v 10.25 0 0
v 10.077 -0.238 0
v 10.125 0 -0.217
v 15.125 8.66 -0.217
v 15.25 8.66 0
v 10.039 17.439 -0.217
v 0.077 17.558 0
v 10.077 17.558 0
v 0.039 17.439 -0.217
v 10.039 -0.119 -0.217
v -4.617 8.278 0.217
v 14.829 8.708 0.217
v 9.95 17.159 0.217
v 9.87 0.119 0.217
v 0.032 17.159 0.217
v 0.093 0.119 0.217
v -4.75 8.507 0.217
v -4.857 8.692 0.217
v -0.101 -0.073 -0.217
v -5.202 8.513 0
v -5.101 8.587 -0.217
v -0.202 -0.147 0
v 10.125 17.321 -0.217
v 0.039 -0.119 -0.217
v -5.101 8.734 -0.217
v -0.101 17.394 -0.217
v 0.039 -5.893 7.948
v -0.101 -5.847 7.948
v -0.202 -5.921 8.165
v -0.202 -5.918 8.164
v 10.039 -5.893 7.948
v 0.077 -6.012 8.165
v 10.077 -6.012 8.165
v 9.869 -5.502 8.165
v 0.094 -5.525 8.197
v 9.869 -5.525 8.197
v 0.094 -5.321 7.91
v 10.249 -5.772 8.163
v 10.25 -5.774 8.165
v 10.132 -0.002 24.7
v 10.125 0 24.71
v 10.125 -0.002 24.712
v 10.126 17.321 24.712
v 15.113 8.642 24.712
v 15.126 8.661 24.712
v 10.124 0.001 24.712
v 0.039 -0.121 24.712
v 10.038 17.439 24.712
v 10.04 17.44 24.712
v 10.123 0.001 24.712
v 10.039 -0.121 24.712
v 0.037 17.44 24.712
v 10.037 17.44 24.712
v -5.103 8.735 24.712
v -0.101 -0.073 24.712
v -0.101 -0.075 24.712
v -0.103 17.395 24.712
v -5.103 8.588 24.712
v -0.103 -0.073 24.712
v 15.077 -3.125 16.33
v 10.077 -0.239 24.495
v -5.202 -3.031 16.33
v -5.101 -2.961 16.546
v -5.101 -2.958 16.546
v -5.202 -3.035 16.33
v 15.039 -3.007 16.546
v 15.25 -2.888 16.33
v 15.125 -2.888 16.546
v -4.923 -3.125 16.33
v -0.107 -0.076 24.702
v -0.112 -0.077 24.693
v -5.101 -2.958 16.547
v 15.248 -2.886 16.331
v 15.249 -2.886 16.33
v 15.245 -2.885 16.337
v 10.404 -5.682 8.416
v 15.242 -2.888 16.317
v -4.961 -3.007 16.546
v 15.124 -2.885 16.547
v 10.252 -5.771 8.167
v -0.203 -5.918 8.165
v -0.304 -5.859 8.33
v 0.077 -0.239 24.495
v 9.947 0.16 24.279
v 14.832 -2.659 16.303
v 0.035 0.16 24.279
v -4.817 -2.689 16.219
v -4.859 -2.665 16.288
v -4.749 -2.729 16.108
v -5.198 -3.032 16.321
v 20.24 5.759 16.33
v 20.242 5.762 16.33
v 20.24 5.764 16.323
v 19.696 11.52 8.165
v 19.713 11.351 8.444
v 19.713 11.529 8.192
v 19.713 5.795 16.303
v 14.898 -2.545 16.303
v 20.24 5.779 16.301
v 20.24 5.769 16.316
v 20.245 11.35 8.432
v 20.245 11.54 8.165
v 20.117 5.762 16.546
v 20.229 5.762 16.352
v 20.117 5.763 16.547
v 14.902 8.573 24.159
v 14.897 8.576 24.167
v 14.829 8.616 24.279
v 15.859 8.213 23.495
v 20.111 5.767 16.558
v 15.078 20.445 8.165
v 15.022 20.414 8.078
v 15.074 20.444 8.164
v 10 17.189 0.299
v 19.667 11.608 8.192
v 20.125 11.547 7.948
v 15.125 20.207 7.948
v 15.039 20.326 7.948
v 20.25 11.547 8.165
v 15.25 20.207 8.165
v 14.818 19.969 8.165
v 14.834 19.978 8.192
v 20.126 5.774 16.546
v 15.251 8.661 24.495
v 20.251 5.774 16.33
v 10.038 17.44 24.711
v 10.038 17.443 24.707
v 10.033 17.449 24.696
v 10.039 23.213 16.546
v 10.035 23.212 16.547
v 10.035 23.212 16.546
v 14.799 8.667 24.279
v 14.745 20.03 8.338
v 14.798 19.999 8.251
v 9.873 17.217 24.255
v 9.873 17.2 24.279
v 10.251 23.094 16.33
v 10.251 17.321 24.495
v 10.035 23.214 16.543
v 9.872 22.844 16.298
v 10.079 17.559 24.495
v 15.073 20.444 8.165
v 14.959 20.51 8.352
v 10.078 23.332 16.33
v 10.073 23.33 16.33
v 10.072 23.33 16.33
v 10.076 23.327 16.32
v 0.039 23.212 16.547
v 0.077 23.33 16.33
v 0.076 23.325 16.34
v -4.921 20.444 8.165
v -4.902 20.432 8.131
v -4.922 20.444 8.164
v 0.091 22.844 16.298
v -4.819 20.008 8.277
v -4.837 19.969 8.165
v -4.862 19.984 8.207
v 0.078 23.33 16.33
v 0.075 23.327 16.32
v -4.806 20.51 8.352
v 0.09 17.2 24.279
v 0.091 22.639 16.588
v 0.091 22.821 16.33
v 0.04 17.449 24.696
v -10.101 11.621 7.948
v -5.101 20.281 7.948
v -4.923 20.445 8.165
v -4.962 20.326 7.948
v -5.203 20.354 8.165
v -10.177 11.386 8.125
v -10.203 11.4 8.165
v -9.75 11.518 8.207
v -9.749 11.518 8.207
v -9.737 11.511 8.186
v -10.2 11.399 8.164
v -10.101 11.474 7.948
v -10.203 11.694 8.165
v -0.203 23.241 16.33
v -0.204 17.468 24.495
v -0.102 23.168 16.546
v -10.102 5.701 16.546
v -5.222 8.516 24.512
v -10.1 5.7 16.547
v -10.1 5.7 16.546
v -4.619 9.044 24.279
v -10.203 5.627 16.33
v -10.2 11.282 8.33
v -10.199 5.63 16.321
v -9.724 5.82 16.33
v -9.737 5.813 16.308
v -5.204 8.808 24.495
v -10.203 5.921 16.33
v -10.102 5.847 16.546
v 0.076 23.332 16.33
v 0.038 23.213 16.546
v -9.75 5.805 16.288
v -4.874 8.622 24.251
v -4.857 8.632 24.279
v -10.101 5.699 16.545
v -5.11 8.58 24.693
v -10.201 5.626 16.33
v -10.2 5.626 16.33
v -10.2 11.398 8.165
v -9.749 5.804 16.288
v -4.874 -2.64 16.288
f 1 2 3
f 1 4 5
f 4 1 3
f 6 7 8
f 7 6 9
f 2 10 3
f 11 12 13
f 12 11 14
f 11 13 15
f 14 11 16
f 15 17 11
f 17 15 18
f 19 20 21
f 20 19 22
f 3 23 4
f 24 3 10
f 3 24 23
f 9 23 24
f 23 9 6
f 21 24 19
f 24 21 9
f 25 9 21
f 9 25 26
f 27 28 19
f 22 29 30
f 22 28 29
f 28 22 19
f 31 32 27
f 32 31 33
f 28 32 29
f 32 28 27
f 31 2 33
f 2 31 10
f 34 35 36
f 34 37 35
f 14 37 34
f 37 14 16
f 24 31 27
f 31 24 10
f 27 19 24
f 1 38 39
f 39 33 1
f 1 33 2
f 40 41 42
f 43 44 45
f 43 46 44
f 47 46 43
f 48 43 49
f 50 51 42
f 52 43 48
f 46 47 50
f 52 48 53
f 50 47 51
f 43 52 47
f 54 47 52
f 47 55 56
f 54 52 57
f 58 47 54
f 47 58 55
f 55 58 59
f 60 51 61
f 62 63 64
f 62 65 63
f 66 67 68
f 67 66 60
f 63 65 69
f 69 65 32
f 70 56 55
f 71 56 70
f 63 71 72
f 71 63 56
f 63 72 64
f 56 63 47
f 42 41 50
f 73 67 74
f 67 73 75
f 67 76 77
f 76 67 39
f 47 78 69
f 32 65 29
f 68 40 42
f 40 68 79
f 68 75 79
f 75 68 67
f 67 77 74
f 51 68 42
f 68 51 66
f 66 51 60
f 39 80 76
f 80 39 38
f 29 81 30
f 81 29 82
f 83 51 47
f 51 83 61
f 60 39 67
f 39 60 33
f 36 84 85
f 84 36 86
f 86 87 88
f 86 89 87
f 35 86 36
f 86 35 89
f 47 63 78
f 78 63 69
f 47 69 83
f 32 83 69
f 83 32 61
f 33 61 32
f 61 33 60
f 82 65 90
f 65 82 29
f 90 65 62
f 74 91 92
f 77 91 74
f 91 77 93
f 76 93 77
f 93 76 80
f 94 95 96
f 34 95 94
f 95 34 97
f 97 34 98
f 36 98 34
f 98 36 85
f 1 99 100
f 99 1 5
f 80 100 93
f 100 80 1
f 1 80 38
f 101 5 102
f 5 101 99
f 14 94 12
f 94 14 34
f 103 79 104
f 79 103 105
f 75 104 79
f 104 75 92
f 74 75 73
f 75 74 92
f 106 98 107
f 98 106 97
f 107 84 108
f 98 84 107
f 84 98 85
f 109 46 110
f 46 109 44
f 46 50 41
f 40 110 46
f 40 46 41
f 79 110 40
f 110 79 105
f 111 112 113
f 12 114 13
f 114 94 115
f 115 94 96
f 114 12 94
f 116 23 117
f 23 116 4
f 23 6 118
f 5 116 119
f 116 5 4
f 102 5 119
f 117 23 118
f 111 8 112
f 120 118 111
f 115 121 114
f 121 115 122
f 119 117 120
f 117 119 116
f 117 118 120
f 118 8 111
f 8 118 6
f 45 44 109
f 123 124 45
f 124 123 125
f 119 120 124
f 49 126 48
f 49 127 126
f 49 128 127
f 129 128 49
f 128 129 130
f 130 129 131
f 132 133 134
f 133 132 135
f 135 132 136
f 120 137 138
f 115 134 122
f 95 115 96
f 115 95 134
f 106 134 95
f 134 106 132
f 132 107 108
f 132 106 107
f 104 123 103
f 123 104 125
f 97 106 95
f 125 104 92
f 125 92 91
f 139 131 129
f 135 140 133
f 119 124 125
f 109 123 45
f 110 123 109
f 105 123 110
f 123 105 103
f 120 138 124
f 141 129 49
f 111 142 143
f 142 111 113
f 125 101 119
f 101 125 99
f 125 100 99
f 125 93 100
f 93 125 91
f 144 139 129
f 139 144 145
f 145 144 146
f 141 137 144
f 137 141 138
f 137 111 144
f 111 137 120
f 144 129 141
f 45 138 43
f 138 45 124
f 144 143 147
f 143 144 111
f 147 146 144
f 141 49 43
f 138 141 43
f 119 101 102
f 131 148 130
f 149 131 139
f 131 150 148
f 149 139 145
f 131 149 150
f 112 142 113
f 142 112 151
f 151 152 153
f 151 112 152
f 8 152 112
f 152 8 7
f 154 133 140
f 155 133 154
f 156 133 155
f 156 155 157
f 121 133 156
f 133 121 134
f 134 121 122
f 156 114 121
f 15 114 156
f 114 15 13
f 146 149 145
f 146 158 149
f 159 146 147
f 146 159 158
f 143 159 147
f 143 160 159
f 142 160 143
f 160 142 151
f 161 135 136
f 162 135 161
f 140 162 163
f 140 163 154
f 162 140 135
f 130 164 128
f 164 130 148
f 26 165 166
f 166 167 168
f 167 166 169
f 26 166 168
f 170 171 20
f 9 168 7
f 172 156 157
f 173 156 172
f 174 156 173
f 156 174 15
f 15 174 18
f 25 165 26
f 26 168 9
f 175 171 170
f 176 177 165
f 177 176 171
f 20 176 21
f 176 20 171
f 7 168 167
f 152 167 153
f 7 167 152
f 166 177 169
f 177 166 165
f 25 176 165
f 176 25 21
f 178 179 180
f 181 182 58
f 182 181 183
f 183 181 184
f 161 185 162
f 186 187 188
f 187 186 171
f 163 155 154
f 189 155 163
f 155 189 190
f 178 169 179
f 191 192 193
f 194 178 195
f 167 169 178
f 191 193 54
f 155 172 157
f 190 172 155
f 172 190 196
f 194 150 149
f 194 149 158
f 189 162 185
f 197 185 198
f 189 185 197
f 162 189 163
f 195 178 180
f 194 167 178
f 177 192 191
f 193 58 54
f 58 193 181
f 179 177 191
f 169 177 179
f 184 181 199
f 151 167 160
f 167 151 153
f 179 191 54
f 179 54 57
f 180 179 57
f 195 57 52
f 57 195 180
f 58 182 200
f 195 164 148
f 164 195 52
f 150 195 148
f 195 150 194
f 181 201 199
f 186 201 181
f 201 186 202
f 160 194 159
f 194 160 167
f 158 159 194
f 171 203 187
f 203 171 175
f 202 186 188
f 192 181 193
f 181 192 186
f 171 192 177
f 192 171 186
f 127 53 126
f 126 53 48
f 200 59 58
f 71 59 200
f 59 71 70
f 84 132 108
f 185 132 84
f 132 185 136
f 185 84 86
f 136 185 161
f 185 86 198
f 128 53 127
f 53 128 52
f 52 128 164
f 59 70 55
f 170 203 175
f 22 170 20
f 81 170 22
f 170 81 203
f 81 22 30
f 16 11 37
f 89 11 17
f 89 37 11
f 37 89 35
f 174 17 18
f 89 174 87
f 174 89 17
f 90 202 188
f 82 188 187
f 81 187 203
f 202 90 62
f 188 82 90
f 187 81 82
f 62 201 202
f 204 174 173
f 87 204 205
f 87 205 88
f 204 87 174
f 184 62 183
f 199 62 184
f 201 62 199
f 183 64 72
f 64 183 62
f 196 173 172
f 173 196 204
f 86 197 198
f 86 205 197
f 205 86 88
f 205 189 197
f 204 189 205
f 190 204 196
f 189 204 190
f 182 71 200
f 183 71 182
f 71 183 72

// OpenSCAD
/*
   folding nets of solids
   kit wallace
   

*/
//thickness of 'paper'
thickness=0.5;
// length of side
length=10;

//quality of curves
steps=20;
scale=1;


// for flattening list and lists of lists

function depth(a) =
   len(a)== undef 
       ? 0
       : 1+depth(a[0]);

function flatten(l) = [ for (a = l) for (b = a) b ] ;

function dflatten(l,d=2) =
// hack to flattened mixed list and list of lists
   flatten([for (a = l) depth(a) > d ? dflatten(a, d) : [a]]);

// dictionary shorthand assuming present
function find(key,array) =  array[search([key],array)[0]];
   
//  functions for creating the matrices for transforming a single point

function m_translate(v) = [ [1, 0, 0, 0],
                            [0, 1, 0, 0],
                            [0, 0, 1, 0],
                            [v.x, v.y, v.z, 1  ] ];

function m_scale(v) =    [ [v.x, 0, 0, 0],
                            [0, v.y, 0, 0],
                            [0, 0, v.z, 0],
                            [0, 0, 0, 1  ] ];
                                                      
function m_rotate(v) =  [ [1,  0,         0,        0],
                          [0,  cos(v.x),  sin(v.x), 0],
                          [0, -sin(v.x),  cos(v.x), 0],
                          [0,  0,         0,        1] ]
                      * [ [ cos(v.y), 0,  -sin(v.y), 0],
                          [0,         1,  0,        0],
                          [ sin(v.y), 0,  cos(v.y), 0],
                          [0,         0,  0,        1] ]
                      * [ [ cos(v.z),  sin(v.z), 0, 0],
                          [-sin(v.z),  cos(v.z), 0, 0],
                          [ 0,         0,        1, 0],
                          [ 0,         0,        0, 1] ];
                            
function m_to(centre,normal) = 
      m_rotate([0, atan2(sqrt(pow(normal.x, 2) + pow(normal.y, 2)), normal.z), 0]) 
    * m_rotate([0, 0, atan2(normal.y, normal.x)]) 
    * m_translate(centre);   

function m_rotate_to(normal) = 
      m_rotate([0, atan2(sqrt(pow(normal.x, 2) + pow(normal.y, 2)), normal.z), 0]) 
    * m_rotate([0, 0, atan2(normal.y, normal.x)]);  
  
function m_from(centre,normal) = 
      m_translate(-centre)
    * m_rotate([0, 0, -atan2(normal.y, normal.x)]) 
    * m_rotate([0, -atan2(sqrt(pow(normal.x, 2) + pow(normal.y, 2)), normal.z), 0]); 

function m_rotate_about_line(a,v1,v2) =
      m_from(v1,v2-v1)*m_rotate([0,0,a])*m_to(v1,v2-v1);

function vec3(v) = [v.x, v.y, v.z];
function m_transform(v, m)  = vec3([v.x, v.y, v.z, 1] * m);
 
function face_transform(face,m) =
     [ for (v = face) m_transform(v,m) ];

function rotate_about_edge(a,face,edge) =
     let (v1 = face[edge], v2= face[(edge+1) %len(face)])
     let (m = m_rotate_about_line(a,v1,v2))
     face_transform(face,m);

// face operations
     
function vsum(points,i=0) =  
      i < len(points)
        ?  (points[i] + vsum(points,i+1))
        :  [0,0,0];
function centre(points) = 
      vsum(points) / len(points);
     
function unitv(v)=  v/ norm(v);

function normal(face) =
     let (n=orthogonal(face[0],face[1],face[2]))
     - n / norm(n);

function signx (x) =
     x==0 ? 1 : sign(x);
     
function angle_between(u, v, n) = 
// protection against inaccurate computation
     let (x= unitv(u) * unitv(v))
     let (y = x <= -1 ? -1 :x >= 1 ? 1 : x)
     let (a = acos(y))
     let (sign = signx(n* cross(u,v)))
     
     sign*a;

function orthogonal(v0,v1,v2) =  cross(v1-v0,v2-v1);
   
function reverse(l,shift=0) = 
     [for (i=[0:len(l)-1]) l[(len(l)-1-i + shift)%len(l)]];   
                        
function r(a,face,edge=0) = 
// replicate the face rotated about edge so the two faces have an internal angle of a
// vertices are reordered so that the edge of rotation is edge 0 in the rotated face 
// and vertices are ordered anticlockwise   
     reverse(rotate_about_edge(a,face,edge),shift=edge+2);

function face_edge(face,edge) =
    [face[edge], face[(edge+1) %len(face)]];

function line(edge) = edge[1]-edge[0];
   
function rp(a,sq,sq_edge,tri,tri_edge=0) =
//  tri is the face to be placed on the sq_edge of sq at angle a
     let (sq_normal= normal(sq),
          sq_edgev=face_edge(sq,sq_edge),
          sq_corner=sq_edgev[0],
          tri_edgev=face_edge(tri,tri_edge), 
          tri_corner=tri_edgev[0],
          ma= m_translate(-tri_corner),  // make edge[0] the origin
          a_tri = face_transform(tri,ma),
          mb = m_rotate_to(-sq_normal),
          b_tri= face_transform(a_tri,mb),  // rotate tri so plane is paralledl to sq
          b_tri_corner = face_edge(b_tri,tri_edge)[0],
          offset = sq_corner - b_tri_corner,
          mc = m_translate(offset),      
          c_tri= face_transform(b_tri,mc), // translate so tri-edge[0] coincides with sq_edge[0]
          c_tri_edgev= face_edge(c_tri,tri_edge),      
          line_tri=line(c_tri_edgev),
          line_sq=line(sq_edgev),
          angle = angle_between(line_tri,line_sq,sq_normal),  // compute angle between edges
          md =  m_rotate_about_line(angle, sq_corner, sq_corner +sq_normal), 
          d_tri= face_transform(c_tri,md) //rotate about edge[0] normal to the plane of sq
          )
    r(a,d_tri,tri_edge);   // finally rotate tri about the common edge
 //   [a_tri,b_tri,c_tri,d_tri, r(a,d_tri,tri_edge),angle]
 
     ;

function place(faces,face_i) =
// place the net so that face_i is on the xy plane
   let (pface=faces[face_i])
   let (n = normal(pface), c=centre(pface))
   let (m=m_from(c,-n))
   [for(face=faces) face_transform(face,m)]
;
   
// use turtle geometry to create shapes defined by length of side and turning angle
function turtle_path(steps,pos=[0,0,0],dir=0,i=0,closed=false) =
   i <len(steps)
      ? let(step = steps[i],
          command = step[0] != undef ? step[0] : "F",
          p = step[0] == undef ? step : step[1])
          command=="L" 
            ? turtle_path(steps,pos,dir+p,i+1)
            : command=="R"
               ? turtle_path(steps,pos,dir-p,i+1)
               : command=="F" 
                 ? let (newpos = pos + p * [cos(dir), sin(dir),0])
                   concat([pos],turtle_path(steps,newpos,dir,i+1)) 
                 : turtle_path(steps,newpos,dir,i+1) // ignore
      : closed ? [pos] : [] ;   

function regular_face(length,sides) =
     turtle_path(flatten([for(i=[1:sides]) [length,["L",360/sides]]]));

function rhomboid_face(length,angle) =
     turtle_path(flatten([for(i=[1:2]) [length,["L",angle],length,["L",180-angle]]]));


// rendering  

colors=["green","blue","red","fuchsia",
        "Hotpink","aqua","teal","purple",
        "black","tan","gold","orange",
        "paleGreen","slateblue","greenyellow",
     
];

module show_edge(e,r=2) {
     translate(e[0]) sphere(r*1.5);
     translate(e[1])  sphere(r);
}

module show_face(s,t=thickness,edge=false) {
// render (convex) face by hulling spheres placed at the vertices
    hull()
    for (i=[0:len(s) -1])
       translate(s[i]) sphere(t/2);     
    if(edge) show_edge([s[0],s[1]]);
} 

module show_faces(faces,t=thickness) {
   for (i=[0:len(faces)-1]) {
      face=faces[i];
      color(colors[i])
       show_face(face,t=thickness);
   }
  
}
       
function ramp(t,dwell) =
// to shape the animation to give a dwell at begining and end
   t < dwell 
       ? 0
       : t > 1 - dwell 
         ? 1
         :  ( t-dwell) /(1 - 2 * dwell);
   
function tface(faces,hinges,current,step) =
     let(side = step[0],   // step
        face_spec = step[1],
        face = face_spec[0] == undef ? face_spec : face_spec[0],
        face_side = face_spec[0] == undef ? 0 : face_spec[1],
        a = step[2] == undef ? hinges[0] : hinges[step[2]])
     rp(a,current,side,faces[face],face_side); 
                    
function rrp(faces,hinges,tree,current) =
    let(root= tree[0])
    let (troot = current == undef ? faces[root] : tface(faces,hinges,current,root))
    concat ( [troot],
             len(tree) > 1
             ?[for (i=[1:len(tree) -1])
              let(step = tree[i])
              depth(step) == 1   //  transformation
                  ? [tface(faces,hinges,troot,step)]
                  : rrp(faces,hinges,step,troot)  // subtree
              ]
             :[]
            );           
            
function fold(name,faces,dihedral_angles,net) =
     [name,faces,dihedral_angles,net];
     
function fold_name(f) = f[0];
function fold_faces(f) = f[1];
function fold_dihedral_angles(f) = f[2];
function fold_net(f) = f[3];

module fold_render(fold, complete) {
   hinges = [for (angle = fold_dihedral_angles(fold) ) 180 -(180 - angle)*complete];
   faces = dflatten(rrp(fold_faces(fold),hinges,fold_net(fold)));
   echo(len(faces),faces);
   show_faces(faces);   
}

function D_net(length) =
   let (p=0)
   fold (
        name = "Dodecahedron",
        faces= [regular_face(length,5)],
        dihedral_angles=[125.264],
        net =  [p,[0,p],[1,p],[2,p],[3,p],
                  [[4,p], [[2,p], [[3,p],[1,p],[2,p],[3,p],[4,p]]]]]
        );
 
function I_net(length) =
   let (t=0)
   fold (
        name = "Icosahedron",
        faces= [regular_face(length,3)],
        dihedral_angles=[138 +11/60],
        net = [t,[0,t],[[1,t],[2,t],[[1,t],[1,t],[[2,t],[2,t], [[1,t],[1,t],[[2,t],[2,t]]]]]], [[2,t],[1,t],[[2,t], [2,t],[[1,t],[1,t],[[2,t],[2,t]]]]]] 
        );

function T_net(length) =
   let (tri=0)
   fold (
        name = "Tetrahedron",
        faces= [regular_face(length,3)],
        dihedral_angles=[70+32/60],
        net =  [tri,[0,tri],[1,tri],[2,tri]]
        );

function C_net(length) =
   let (sq=0)
   fold (
        name = "Cube",
        faces= [regular_face(length,4)],
        dihedral_angles=[90],
        net =  [sq, [0,sq], [1,sq] , [2,sq], [[3,sq],[2,sq] ]] 
        );

function O_net(length) =
   let (tri=0)
   fold (
        name = "Octahedron",
        faces= [regular_face(length,3)],
        dihedral_angles=[109+28/60],
        net =  [tri, [0,tri] , [[1,tri],[2,tri], [[1,tri],[2,tri]]],[[2,tri], [2,tri]]] 

        );
function tC_net(length) =
   let (oct=0,tri=1)
   fold (
        name = "Truncated Cube",
        faces= [regular_face(length,8),regular_face(length,3)],
        dihedral_angles=[90, 125.264],
        net = [oct,[0,oct],
                   [1,tri,1],
                   [[2,oct],[3,tri,1],[5,tri,1],
                                    [[4,oct],[3,tri,1],[5,tri,1]]],
                   [3,tri,1],
                   [4,oct],
                   [5,tri,1],
                   [6,oct],
                   [7,tri,1]
               ]           

        );
        
function aC_net(length) =
   let (tri=0,sq=1)
   fold (
        name = "Cubeoctahedron",
        faces= [regular_face(length,3),regular_face(length,4)],
        dihedral_angles=[125.264],
        net = [tri,[[0,sq],[0,tri],[2,tri]],
                   [[1,sq],[[2,tri],[[1,sq], [2,tri]]]],
                   [[2,sq],[[2,tri],[2,sq],[[1,sq],[1,tri],[3,tri]]]]
              ]
        );
        
function daC_net(length) =
    let(a=0,b=1)
    fold(
        name="Rhombic Dodecahedron",
        faces =[rhomboid_face(length,109+28/60),rhomboid_face(length,180 - (109+28/60))],
        dihedral_angles=[120],
        net= [ a,[[2,a],[[1,a], [[2,b],  [[3,b],[[2,a], [[1,a], [[2,b], [[3,b], [[2,a],[[1,a],[2,b]]]]]]]]]]]]

        );

function tO_net(length) =
    let(sq=0,hex=1)
    fold(
        name="Rhombic Dodecahedron",
        faces =[regular_face(length,4),regular_face(length,6)],
        dihedral_angles=[125+16/60,109+28/60],
        net= 
        [ hex, [0,sq],
               [[1,hex],[5,sq], [[4,hex],[1,sq]]],
               [3,hex],
               [[5,hex], [1,sq], [4,hex], [[2,hex],[5,sq], [[4,hex],[1,sq]]]]
        ]
        );


function tO_net_v2(length) =
    let(sq=0,hex=1)
    fold(
        name="Rhombic Dodecahedron",
        faces =[regular_face(length,4),regular_face(length,6)],
        dihedral_angles=[109+28/60,125+16/60],
        net= 
        [ hex, [[0,sq,1],[2,hex,1]],
               [[1,hex],[3,sq,1]],
               [[2,sq,1],[2,hex,1]],
               [[3,hex],[3,sq,1]],
               [[4,sq,1],[[2,hex,1],[3,hex]]],
               [[5,hex],[3,sq,1]]
        ]
        );

function DP3_net (length) =
    let(tri=0)
    fold(
       name="Triangular dipyramid",
       faces= [regular_face(length,3)],
       dihedral_angles =[70.53,2*70.53],
       net= [tri, [[1,tri,0], [1,tri,0]],[[2,tri,1], [[1,tri,0],[2,tri,0]]]]
    );

function DP5_net(length) =
     let (tri=0)
     fold(
         name = "Pentagonal Dipyramid",
         faces= [regular_face(length,3)],
         dihedral_angles=[138,75],
         net= [tri, [[2,tri], [[2,tri],[[2,tri], [2,tri] ]]], [[1,tri,1], [[1,tri], [[2,tri], [[2,tri], [2,tri]]]]]]
         
     );
function test(length) =
    let (tri=0)
   fold (
        name = "test",
        faces= [regular_face(length,3)],
        dihedral_angles=[109+28/60],
        net = [tri,[0,tri],[1,tri], [[2,tri], [[2,tri],[1,tri]]]] 
//        net = [tri,[1,tri],[2,tri], [[0,tri],[1,tri]]]
        );
        
$t=1;
pfold = tO_net_v2(length);
echo(fold_net(pfold));
fold_render(pfold,$t);
